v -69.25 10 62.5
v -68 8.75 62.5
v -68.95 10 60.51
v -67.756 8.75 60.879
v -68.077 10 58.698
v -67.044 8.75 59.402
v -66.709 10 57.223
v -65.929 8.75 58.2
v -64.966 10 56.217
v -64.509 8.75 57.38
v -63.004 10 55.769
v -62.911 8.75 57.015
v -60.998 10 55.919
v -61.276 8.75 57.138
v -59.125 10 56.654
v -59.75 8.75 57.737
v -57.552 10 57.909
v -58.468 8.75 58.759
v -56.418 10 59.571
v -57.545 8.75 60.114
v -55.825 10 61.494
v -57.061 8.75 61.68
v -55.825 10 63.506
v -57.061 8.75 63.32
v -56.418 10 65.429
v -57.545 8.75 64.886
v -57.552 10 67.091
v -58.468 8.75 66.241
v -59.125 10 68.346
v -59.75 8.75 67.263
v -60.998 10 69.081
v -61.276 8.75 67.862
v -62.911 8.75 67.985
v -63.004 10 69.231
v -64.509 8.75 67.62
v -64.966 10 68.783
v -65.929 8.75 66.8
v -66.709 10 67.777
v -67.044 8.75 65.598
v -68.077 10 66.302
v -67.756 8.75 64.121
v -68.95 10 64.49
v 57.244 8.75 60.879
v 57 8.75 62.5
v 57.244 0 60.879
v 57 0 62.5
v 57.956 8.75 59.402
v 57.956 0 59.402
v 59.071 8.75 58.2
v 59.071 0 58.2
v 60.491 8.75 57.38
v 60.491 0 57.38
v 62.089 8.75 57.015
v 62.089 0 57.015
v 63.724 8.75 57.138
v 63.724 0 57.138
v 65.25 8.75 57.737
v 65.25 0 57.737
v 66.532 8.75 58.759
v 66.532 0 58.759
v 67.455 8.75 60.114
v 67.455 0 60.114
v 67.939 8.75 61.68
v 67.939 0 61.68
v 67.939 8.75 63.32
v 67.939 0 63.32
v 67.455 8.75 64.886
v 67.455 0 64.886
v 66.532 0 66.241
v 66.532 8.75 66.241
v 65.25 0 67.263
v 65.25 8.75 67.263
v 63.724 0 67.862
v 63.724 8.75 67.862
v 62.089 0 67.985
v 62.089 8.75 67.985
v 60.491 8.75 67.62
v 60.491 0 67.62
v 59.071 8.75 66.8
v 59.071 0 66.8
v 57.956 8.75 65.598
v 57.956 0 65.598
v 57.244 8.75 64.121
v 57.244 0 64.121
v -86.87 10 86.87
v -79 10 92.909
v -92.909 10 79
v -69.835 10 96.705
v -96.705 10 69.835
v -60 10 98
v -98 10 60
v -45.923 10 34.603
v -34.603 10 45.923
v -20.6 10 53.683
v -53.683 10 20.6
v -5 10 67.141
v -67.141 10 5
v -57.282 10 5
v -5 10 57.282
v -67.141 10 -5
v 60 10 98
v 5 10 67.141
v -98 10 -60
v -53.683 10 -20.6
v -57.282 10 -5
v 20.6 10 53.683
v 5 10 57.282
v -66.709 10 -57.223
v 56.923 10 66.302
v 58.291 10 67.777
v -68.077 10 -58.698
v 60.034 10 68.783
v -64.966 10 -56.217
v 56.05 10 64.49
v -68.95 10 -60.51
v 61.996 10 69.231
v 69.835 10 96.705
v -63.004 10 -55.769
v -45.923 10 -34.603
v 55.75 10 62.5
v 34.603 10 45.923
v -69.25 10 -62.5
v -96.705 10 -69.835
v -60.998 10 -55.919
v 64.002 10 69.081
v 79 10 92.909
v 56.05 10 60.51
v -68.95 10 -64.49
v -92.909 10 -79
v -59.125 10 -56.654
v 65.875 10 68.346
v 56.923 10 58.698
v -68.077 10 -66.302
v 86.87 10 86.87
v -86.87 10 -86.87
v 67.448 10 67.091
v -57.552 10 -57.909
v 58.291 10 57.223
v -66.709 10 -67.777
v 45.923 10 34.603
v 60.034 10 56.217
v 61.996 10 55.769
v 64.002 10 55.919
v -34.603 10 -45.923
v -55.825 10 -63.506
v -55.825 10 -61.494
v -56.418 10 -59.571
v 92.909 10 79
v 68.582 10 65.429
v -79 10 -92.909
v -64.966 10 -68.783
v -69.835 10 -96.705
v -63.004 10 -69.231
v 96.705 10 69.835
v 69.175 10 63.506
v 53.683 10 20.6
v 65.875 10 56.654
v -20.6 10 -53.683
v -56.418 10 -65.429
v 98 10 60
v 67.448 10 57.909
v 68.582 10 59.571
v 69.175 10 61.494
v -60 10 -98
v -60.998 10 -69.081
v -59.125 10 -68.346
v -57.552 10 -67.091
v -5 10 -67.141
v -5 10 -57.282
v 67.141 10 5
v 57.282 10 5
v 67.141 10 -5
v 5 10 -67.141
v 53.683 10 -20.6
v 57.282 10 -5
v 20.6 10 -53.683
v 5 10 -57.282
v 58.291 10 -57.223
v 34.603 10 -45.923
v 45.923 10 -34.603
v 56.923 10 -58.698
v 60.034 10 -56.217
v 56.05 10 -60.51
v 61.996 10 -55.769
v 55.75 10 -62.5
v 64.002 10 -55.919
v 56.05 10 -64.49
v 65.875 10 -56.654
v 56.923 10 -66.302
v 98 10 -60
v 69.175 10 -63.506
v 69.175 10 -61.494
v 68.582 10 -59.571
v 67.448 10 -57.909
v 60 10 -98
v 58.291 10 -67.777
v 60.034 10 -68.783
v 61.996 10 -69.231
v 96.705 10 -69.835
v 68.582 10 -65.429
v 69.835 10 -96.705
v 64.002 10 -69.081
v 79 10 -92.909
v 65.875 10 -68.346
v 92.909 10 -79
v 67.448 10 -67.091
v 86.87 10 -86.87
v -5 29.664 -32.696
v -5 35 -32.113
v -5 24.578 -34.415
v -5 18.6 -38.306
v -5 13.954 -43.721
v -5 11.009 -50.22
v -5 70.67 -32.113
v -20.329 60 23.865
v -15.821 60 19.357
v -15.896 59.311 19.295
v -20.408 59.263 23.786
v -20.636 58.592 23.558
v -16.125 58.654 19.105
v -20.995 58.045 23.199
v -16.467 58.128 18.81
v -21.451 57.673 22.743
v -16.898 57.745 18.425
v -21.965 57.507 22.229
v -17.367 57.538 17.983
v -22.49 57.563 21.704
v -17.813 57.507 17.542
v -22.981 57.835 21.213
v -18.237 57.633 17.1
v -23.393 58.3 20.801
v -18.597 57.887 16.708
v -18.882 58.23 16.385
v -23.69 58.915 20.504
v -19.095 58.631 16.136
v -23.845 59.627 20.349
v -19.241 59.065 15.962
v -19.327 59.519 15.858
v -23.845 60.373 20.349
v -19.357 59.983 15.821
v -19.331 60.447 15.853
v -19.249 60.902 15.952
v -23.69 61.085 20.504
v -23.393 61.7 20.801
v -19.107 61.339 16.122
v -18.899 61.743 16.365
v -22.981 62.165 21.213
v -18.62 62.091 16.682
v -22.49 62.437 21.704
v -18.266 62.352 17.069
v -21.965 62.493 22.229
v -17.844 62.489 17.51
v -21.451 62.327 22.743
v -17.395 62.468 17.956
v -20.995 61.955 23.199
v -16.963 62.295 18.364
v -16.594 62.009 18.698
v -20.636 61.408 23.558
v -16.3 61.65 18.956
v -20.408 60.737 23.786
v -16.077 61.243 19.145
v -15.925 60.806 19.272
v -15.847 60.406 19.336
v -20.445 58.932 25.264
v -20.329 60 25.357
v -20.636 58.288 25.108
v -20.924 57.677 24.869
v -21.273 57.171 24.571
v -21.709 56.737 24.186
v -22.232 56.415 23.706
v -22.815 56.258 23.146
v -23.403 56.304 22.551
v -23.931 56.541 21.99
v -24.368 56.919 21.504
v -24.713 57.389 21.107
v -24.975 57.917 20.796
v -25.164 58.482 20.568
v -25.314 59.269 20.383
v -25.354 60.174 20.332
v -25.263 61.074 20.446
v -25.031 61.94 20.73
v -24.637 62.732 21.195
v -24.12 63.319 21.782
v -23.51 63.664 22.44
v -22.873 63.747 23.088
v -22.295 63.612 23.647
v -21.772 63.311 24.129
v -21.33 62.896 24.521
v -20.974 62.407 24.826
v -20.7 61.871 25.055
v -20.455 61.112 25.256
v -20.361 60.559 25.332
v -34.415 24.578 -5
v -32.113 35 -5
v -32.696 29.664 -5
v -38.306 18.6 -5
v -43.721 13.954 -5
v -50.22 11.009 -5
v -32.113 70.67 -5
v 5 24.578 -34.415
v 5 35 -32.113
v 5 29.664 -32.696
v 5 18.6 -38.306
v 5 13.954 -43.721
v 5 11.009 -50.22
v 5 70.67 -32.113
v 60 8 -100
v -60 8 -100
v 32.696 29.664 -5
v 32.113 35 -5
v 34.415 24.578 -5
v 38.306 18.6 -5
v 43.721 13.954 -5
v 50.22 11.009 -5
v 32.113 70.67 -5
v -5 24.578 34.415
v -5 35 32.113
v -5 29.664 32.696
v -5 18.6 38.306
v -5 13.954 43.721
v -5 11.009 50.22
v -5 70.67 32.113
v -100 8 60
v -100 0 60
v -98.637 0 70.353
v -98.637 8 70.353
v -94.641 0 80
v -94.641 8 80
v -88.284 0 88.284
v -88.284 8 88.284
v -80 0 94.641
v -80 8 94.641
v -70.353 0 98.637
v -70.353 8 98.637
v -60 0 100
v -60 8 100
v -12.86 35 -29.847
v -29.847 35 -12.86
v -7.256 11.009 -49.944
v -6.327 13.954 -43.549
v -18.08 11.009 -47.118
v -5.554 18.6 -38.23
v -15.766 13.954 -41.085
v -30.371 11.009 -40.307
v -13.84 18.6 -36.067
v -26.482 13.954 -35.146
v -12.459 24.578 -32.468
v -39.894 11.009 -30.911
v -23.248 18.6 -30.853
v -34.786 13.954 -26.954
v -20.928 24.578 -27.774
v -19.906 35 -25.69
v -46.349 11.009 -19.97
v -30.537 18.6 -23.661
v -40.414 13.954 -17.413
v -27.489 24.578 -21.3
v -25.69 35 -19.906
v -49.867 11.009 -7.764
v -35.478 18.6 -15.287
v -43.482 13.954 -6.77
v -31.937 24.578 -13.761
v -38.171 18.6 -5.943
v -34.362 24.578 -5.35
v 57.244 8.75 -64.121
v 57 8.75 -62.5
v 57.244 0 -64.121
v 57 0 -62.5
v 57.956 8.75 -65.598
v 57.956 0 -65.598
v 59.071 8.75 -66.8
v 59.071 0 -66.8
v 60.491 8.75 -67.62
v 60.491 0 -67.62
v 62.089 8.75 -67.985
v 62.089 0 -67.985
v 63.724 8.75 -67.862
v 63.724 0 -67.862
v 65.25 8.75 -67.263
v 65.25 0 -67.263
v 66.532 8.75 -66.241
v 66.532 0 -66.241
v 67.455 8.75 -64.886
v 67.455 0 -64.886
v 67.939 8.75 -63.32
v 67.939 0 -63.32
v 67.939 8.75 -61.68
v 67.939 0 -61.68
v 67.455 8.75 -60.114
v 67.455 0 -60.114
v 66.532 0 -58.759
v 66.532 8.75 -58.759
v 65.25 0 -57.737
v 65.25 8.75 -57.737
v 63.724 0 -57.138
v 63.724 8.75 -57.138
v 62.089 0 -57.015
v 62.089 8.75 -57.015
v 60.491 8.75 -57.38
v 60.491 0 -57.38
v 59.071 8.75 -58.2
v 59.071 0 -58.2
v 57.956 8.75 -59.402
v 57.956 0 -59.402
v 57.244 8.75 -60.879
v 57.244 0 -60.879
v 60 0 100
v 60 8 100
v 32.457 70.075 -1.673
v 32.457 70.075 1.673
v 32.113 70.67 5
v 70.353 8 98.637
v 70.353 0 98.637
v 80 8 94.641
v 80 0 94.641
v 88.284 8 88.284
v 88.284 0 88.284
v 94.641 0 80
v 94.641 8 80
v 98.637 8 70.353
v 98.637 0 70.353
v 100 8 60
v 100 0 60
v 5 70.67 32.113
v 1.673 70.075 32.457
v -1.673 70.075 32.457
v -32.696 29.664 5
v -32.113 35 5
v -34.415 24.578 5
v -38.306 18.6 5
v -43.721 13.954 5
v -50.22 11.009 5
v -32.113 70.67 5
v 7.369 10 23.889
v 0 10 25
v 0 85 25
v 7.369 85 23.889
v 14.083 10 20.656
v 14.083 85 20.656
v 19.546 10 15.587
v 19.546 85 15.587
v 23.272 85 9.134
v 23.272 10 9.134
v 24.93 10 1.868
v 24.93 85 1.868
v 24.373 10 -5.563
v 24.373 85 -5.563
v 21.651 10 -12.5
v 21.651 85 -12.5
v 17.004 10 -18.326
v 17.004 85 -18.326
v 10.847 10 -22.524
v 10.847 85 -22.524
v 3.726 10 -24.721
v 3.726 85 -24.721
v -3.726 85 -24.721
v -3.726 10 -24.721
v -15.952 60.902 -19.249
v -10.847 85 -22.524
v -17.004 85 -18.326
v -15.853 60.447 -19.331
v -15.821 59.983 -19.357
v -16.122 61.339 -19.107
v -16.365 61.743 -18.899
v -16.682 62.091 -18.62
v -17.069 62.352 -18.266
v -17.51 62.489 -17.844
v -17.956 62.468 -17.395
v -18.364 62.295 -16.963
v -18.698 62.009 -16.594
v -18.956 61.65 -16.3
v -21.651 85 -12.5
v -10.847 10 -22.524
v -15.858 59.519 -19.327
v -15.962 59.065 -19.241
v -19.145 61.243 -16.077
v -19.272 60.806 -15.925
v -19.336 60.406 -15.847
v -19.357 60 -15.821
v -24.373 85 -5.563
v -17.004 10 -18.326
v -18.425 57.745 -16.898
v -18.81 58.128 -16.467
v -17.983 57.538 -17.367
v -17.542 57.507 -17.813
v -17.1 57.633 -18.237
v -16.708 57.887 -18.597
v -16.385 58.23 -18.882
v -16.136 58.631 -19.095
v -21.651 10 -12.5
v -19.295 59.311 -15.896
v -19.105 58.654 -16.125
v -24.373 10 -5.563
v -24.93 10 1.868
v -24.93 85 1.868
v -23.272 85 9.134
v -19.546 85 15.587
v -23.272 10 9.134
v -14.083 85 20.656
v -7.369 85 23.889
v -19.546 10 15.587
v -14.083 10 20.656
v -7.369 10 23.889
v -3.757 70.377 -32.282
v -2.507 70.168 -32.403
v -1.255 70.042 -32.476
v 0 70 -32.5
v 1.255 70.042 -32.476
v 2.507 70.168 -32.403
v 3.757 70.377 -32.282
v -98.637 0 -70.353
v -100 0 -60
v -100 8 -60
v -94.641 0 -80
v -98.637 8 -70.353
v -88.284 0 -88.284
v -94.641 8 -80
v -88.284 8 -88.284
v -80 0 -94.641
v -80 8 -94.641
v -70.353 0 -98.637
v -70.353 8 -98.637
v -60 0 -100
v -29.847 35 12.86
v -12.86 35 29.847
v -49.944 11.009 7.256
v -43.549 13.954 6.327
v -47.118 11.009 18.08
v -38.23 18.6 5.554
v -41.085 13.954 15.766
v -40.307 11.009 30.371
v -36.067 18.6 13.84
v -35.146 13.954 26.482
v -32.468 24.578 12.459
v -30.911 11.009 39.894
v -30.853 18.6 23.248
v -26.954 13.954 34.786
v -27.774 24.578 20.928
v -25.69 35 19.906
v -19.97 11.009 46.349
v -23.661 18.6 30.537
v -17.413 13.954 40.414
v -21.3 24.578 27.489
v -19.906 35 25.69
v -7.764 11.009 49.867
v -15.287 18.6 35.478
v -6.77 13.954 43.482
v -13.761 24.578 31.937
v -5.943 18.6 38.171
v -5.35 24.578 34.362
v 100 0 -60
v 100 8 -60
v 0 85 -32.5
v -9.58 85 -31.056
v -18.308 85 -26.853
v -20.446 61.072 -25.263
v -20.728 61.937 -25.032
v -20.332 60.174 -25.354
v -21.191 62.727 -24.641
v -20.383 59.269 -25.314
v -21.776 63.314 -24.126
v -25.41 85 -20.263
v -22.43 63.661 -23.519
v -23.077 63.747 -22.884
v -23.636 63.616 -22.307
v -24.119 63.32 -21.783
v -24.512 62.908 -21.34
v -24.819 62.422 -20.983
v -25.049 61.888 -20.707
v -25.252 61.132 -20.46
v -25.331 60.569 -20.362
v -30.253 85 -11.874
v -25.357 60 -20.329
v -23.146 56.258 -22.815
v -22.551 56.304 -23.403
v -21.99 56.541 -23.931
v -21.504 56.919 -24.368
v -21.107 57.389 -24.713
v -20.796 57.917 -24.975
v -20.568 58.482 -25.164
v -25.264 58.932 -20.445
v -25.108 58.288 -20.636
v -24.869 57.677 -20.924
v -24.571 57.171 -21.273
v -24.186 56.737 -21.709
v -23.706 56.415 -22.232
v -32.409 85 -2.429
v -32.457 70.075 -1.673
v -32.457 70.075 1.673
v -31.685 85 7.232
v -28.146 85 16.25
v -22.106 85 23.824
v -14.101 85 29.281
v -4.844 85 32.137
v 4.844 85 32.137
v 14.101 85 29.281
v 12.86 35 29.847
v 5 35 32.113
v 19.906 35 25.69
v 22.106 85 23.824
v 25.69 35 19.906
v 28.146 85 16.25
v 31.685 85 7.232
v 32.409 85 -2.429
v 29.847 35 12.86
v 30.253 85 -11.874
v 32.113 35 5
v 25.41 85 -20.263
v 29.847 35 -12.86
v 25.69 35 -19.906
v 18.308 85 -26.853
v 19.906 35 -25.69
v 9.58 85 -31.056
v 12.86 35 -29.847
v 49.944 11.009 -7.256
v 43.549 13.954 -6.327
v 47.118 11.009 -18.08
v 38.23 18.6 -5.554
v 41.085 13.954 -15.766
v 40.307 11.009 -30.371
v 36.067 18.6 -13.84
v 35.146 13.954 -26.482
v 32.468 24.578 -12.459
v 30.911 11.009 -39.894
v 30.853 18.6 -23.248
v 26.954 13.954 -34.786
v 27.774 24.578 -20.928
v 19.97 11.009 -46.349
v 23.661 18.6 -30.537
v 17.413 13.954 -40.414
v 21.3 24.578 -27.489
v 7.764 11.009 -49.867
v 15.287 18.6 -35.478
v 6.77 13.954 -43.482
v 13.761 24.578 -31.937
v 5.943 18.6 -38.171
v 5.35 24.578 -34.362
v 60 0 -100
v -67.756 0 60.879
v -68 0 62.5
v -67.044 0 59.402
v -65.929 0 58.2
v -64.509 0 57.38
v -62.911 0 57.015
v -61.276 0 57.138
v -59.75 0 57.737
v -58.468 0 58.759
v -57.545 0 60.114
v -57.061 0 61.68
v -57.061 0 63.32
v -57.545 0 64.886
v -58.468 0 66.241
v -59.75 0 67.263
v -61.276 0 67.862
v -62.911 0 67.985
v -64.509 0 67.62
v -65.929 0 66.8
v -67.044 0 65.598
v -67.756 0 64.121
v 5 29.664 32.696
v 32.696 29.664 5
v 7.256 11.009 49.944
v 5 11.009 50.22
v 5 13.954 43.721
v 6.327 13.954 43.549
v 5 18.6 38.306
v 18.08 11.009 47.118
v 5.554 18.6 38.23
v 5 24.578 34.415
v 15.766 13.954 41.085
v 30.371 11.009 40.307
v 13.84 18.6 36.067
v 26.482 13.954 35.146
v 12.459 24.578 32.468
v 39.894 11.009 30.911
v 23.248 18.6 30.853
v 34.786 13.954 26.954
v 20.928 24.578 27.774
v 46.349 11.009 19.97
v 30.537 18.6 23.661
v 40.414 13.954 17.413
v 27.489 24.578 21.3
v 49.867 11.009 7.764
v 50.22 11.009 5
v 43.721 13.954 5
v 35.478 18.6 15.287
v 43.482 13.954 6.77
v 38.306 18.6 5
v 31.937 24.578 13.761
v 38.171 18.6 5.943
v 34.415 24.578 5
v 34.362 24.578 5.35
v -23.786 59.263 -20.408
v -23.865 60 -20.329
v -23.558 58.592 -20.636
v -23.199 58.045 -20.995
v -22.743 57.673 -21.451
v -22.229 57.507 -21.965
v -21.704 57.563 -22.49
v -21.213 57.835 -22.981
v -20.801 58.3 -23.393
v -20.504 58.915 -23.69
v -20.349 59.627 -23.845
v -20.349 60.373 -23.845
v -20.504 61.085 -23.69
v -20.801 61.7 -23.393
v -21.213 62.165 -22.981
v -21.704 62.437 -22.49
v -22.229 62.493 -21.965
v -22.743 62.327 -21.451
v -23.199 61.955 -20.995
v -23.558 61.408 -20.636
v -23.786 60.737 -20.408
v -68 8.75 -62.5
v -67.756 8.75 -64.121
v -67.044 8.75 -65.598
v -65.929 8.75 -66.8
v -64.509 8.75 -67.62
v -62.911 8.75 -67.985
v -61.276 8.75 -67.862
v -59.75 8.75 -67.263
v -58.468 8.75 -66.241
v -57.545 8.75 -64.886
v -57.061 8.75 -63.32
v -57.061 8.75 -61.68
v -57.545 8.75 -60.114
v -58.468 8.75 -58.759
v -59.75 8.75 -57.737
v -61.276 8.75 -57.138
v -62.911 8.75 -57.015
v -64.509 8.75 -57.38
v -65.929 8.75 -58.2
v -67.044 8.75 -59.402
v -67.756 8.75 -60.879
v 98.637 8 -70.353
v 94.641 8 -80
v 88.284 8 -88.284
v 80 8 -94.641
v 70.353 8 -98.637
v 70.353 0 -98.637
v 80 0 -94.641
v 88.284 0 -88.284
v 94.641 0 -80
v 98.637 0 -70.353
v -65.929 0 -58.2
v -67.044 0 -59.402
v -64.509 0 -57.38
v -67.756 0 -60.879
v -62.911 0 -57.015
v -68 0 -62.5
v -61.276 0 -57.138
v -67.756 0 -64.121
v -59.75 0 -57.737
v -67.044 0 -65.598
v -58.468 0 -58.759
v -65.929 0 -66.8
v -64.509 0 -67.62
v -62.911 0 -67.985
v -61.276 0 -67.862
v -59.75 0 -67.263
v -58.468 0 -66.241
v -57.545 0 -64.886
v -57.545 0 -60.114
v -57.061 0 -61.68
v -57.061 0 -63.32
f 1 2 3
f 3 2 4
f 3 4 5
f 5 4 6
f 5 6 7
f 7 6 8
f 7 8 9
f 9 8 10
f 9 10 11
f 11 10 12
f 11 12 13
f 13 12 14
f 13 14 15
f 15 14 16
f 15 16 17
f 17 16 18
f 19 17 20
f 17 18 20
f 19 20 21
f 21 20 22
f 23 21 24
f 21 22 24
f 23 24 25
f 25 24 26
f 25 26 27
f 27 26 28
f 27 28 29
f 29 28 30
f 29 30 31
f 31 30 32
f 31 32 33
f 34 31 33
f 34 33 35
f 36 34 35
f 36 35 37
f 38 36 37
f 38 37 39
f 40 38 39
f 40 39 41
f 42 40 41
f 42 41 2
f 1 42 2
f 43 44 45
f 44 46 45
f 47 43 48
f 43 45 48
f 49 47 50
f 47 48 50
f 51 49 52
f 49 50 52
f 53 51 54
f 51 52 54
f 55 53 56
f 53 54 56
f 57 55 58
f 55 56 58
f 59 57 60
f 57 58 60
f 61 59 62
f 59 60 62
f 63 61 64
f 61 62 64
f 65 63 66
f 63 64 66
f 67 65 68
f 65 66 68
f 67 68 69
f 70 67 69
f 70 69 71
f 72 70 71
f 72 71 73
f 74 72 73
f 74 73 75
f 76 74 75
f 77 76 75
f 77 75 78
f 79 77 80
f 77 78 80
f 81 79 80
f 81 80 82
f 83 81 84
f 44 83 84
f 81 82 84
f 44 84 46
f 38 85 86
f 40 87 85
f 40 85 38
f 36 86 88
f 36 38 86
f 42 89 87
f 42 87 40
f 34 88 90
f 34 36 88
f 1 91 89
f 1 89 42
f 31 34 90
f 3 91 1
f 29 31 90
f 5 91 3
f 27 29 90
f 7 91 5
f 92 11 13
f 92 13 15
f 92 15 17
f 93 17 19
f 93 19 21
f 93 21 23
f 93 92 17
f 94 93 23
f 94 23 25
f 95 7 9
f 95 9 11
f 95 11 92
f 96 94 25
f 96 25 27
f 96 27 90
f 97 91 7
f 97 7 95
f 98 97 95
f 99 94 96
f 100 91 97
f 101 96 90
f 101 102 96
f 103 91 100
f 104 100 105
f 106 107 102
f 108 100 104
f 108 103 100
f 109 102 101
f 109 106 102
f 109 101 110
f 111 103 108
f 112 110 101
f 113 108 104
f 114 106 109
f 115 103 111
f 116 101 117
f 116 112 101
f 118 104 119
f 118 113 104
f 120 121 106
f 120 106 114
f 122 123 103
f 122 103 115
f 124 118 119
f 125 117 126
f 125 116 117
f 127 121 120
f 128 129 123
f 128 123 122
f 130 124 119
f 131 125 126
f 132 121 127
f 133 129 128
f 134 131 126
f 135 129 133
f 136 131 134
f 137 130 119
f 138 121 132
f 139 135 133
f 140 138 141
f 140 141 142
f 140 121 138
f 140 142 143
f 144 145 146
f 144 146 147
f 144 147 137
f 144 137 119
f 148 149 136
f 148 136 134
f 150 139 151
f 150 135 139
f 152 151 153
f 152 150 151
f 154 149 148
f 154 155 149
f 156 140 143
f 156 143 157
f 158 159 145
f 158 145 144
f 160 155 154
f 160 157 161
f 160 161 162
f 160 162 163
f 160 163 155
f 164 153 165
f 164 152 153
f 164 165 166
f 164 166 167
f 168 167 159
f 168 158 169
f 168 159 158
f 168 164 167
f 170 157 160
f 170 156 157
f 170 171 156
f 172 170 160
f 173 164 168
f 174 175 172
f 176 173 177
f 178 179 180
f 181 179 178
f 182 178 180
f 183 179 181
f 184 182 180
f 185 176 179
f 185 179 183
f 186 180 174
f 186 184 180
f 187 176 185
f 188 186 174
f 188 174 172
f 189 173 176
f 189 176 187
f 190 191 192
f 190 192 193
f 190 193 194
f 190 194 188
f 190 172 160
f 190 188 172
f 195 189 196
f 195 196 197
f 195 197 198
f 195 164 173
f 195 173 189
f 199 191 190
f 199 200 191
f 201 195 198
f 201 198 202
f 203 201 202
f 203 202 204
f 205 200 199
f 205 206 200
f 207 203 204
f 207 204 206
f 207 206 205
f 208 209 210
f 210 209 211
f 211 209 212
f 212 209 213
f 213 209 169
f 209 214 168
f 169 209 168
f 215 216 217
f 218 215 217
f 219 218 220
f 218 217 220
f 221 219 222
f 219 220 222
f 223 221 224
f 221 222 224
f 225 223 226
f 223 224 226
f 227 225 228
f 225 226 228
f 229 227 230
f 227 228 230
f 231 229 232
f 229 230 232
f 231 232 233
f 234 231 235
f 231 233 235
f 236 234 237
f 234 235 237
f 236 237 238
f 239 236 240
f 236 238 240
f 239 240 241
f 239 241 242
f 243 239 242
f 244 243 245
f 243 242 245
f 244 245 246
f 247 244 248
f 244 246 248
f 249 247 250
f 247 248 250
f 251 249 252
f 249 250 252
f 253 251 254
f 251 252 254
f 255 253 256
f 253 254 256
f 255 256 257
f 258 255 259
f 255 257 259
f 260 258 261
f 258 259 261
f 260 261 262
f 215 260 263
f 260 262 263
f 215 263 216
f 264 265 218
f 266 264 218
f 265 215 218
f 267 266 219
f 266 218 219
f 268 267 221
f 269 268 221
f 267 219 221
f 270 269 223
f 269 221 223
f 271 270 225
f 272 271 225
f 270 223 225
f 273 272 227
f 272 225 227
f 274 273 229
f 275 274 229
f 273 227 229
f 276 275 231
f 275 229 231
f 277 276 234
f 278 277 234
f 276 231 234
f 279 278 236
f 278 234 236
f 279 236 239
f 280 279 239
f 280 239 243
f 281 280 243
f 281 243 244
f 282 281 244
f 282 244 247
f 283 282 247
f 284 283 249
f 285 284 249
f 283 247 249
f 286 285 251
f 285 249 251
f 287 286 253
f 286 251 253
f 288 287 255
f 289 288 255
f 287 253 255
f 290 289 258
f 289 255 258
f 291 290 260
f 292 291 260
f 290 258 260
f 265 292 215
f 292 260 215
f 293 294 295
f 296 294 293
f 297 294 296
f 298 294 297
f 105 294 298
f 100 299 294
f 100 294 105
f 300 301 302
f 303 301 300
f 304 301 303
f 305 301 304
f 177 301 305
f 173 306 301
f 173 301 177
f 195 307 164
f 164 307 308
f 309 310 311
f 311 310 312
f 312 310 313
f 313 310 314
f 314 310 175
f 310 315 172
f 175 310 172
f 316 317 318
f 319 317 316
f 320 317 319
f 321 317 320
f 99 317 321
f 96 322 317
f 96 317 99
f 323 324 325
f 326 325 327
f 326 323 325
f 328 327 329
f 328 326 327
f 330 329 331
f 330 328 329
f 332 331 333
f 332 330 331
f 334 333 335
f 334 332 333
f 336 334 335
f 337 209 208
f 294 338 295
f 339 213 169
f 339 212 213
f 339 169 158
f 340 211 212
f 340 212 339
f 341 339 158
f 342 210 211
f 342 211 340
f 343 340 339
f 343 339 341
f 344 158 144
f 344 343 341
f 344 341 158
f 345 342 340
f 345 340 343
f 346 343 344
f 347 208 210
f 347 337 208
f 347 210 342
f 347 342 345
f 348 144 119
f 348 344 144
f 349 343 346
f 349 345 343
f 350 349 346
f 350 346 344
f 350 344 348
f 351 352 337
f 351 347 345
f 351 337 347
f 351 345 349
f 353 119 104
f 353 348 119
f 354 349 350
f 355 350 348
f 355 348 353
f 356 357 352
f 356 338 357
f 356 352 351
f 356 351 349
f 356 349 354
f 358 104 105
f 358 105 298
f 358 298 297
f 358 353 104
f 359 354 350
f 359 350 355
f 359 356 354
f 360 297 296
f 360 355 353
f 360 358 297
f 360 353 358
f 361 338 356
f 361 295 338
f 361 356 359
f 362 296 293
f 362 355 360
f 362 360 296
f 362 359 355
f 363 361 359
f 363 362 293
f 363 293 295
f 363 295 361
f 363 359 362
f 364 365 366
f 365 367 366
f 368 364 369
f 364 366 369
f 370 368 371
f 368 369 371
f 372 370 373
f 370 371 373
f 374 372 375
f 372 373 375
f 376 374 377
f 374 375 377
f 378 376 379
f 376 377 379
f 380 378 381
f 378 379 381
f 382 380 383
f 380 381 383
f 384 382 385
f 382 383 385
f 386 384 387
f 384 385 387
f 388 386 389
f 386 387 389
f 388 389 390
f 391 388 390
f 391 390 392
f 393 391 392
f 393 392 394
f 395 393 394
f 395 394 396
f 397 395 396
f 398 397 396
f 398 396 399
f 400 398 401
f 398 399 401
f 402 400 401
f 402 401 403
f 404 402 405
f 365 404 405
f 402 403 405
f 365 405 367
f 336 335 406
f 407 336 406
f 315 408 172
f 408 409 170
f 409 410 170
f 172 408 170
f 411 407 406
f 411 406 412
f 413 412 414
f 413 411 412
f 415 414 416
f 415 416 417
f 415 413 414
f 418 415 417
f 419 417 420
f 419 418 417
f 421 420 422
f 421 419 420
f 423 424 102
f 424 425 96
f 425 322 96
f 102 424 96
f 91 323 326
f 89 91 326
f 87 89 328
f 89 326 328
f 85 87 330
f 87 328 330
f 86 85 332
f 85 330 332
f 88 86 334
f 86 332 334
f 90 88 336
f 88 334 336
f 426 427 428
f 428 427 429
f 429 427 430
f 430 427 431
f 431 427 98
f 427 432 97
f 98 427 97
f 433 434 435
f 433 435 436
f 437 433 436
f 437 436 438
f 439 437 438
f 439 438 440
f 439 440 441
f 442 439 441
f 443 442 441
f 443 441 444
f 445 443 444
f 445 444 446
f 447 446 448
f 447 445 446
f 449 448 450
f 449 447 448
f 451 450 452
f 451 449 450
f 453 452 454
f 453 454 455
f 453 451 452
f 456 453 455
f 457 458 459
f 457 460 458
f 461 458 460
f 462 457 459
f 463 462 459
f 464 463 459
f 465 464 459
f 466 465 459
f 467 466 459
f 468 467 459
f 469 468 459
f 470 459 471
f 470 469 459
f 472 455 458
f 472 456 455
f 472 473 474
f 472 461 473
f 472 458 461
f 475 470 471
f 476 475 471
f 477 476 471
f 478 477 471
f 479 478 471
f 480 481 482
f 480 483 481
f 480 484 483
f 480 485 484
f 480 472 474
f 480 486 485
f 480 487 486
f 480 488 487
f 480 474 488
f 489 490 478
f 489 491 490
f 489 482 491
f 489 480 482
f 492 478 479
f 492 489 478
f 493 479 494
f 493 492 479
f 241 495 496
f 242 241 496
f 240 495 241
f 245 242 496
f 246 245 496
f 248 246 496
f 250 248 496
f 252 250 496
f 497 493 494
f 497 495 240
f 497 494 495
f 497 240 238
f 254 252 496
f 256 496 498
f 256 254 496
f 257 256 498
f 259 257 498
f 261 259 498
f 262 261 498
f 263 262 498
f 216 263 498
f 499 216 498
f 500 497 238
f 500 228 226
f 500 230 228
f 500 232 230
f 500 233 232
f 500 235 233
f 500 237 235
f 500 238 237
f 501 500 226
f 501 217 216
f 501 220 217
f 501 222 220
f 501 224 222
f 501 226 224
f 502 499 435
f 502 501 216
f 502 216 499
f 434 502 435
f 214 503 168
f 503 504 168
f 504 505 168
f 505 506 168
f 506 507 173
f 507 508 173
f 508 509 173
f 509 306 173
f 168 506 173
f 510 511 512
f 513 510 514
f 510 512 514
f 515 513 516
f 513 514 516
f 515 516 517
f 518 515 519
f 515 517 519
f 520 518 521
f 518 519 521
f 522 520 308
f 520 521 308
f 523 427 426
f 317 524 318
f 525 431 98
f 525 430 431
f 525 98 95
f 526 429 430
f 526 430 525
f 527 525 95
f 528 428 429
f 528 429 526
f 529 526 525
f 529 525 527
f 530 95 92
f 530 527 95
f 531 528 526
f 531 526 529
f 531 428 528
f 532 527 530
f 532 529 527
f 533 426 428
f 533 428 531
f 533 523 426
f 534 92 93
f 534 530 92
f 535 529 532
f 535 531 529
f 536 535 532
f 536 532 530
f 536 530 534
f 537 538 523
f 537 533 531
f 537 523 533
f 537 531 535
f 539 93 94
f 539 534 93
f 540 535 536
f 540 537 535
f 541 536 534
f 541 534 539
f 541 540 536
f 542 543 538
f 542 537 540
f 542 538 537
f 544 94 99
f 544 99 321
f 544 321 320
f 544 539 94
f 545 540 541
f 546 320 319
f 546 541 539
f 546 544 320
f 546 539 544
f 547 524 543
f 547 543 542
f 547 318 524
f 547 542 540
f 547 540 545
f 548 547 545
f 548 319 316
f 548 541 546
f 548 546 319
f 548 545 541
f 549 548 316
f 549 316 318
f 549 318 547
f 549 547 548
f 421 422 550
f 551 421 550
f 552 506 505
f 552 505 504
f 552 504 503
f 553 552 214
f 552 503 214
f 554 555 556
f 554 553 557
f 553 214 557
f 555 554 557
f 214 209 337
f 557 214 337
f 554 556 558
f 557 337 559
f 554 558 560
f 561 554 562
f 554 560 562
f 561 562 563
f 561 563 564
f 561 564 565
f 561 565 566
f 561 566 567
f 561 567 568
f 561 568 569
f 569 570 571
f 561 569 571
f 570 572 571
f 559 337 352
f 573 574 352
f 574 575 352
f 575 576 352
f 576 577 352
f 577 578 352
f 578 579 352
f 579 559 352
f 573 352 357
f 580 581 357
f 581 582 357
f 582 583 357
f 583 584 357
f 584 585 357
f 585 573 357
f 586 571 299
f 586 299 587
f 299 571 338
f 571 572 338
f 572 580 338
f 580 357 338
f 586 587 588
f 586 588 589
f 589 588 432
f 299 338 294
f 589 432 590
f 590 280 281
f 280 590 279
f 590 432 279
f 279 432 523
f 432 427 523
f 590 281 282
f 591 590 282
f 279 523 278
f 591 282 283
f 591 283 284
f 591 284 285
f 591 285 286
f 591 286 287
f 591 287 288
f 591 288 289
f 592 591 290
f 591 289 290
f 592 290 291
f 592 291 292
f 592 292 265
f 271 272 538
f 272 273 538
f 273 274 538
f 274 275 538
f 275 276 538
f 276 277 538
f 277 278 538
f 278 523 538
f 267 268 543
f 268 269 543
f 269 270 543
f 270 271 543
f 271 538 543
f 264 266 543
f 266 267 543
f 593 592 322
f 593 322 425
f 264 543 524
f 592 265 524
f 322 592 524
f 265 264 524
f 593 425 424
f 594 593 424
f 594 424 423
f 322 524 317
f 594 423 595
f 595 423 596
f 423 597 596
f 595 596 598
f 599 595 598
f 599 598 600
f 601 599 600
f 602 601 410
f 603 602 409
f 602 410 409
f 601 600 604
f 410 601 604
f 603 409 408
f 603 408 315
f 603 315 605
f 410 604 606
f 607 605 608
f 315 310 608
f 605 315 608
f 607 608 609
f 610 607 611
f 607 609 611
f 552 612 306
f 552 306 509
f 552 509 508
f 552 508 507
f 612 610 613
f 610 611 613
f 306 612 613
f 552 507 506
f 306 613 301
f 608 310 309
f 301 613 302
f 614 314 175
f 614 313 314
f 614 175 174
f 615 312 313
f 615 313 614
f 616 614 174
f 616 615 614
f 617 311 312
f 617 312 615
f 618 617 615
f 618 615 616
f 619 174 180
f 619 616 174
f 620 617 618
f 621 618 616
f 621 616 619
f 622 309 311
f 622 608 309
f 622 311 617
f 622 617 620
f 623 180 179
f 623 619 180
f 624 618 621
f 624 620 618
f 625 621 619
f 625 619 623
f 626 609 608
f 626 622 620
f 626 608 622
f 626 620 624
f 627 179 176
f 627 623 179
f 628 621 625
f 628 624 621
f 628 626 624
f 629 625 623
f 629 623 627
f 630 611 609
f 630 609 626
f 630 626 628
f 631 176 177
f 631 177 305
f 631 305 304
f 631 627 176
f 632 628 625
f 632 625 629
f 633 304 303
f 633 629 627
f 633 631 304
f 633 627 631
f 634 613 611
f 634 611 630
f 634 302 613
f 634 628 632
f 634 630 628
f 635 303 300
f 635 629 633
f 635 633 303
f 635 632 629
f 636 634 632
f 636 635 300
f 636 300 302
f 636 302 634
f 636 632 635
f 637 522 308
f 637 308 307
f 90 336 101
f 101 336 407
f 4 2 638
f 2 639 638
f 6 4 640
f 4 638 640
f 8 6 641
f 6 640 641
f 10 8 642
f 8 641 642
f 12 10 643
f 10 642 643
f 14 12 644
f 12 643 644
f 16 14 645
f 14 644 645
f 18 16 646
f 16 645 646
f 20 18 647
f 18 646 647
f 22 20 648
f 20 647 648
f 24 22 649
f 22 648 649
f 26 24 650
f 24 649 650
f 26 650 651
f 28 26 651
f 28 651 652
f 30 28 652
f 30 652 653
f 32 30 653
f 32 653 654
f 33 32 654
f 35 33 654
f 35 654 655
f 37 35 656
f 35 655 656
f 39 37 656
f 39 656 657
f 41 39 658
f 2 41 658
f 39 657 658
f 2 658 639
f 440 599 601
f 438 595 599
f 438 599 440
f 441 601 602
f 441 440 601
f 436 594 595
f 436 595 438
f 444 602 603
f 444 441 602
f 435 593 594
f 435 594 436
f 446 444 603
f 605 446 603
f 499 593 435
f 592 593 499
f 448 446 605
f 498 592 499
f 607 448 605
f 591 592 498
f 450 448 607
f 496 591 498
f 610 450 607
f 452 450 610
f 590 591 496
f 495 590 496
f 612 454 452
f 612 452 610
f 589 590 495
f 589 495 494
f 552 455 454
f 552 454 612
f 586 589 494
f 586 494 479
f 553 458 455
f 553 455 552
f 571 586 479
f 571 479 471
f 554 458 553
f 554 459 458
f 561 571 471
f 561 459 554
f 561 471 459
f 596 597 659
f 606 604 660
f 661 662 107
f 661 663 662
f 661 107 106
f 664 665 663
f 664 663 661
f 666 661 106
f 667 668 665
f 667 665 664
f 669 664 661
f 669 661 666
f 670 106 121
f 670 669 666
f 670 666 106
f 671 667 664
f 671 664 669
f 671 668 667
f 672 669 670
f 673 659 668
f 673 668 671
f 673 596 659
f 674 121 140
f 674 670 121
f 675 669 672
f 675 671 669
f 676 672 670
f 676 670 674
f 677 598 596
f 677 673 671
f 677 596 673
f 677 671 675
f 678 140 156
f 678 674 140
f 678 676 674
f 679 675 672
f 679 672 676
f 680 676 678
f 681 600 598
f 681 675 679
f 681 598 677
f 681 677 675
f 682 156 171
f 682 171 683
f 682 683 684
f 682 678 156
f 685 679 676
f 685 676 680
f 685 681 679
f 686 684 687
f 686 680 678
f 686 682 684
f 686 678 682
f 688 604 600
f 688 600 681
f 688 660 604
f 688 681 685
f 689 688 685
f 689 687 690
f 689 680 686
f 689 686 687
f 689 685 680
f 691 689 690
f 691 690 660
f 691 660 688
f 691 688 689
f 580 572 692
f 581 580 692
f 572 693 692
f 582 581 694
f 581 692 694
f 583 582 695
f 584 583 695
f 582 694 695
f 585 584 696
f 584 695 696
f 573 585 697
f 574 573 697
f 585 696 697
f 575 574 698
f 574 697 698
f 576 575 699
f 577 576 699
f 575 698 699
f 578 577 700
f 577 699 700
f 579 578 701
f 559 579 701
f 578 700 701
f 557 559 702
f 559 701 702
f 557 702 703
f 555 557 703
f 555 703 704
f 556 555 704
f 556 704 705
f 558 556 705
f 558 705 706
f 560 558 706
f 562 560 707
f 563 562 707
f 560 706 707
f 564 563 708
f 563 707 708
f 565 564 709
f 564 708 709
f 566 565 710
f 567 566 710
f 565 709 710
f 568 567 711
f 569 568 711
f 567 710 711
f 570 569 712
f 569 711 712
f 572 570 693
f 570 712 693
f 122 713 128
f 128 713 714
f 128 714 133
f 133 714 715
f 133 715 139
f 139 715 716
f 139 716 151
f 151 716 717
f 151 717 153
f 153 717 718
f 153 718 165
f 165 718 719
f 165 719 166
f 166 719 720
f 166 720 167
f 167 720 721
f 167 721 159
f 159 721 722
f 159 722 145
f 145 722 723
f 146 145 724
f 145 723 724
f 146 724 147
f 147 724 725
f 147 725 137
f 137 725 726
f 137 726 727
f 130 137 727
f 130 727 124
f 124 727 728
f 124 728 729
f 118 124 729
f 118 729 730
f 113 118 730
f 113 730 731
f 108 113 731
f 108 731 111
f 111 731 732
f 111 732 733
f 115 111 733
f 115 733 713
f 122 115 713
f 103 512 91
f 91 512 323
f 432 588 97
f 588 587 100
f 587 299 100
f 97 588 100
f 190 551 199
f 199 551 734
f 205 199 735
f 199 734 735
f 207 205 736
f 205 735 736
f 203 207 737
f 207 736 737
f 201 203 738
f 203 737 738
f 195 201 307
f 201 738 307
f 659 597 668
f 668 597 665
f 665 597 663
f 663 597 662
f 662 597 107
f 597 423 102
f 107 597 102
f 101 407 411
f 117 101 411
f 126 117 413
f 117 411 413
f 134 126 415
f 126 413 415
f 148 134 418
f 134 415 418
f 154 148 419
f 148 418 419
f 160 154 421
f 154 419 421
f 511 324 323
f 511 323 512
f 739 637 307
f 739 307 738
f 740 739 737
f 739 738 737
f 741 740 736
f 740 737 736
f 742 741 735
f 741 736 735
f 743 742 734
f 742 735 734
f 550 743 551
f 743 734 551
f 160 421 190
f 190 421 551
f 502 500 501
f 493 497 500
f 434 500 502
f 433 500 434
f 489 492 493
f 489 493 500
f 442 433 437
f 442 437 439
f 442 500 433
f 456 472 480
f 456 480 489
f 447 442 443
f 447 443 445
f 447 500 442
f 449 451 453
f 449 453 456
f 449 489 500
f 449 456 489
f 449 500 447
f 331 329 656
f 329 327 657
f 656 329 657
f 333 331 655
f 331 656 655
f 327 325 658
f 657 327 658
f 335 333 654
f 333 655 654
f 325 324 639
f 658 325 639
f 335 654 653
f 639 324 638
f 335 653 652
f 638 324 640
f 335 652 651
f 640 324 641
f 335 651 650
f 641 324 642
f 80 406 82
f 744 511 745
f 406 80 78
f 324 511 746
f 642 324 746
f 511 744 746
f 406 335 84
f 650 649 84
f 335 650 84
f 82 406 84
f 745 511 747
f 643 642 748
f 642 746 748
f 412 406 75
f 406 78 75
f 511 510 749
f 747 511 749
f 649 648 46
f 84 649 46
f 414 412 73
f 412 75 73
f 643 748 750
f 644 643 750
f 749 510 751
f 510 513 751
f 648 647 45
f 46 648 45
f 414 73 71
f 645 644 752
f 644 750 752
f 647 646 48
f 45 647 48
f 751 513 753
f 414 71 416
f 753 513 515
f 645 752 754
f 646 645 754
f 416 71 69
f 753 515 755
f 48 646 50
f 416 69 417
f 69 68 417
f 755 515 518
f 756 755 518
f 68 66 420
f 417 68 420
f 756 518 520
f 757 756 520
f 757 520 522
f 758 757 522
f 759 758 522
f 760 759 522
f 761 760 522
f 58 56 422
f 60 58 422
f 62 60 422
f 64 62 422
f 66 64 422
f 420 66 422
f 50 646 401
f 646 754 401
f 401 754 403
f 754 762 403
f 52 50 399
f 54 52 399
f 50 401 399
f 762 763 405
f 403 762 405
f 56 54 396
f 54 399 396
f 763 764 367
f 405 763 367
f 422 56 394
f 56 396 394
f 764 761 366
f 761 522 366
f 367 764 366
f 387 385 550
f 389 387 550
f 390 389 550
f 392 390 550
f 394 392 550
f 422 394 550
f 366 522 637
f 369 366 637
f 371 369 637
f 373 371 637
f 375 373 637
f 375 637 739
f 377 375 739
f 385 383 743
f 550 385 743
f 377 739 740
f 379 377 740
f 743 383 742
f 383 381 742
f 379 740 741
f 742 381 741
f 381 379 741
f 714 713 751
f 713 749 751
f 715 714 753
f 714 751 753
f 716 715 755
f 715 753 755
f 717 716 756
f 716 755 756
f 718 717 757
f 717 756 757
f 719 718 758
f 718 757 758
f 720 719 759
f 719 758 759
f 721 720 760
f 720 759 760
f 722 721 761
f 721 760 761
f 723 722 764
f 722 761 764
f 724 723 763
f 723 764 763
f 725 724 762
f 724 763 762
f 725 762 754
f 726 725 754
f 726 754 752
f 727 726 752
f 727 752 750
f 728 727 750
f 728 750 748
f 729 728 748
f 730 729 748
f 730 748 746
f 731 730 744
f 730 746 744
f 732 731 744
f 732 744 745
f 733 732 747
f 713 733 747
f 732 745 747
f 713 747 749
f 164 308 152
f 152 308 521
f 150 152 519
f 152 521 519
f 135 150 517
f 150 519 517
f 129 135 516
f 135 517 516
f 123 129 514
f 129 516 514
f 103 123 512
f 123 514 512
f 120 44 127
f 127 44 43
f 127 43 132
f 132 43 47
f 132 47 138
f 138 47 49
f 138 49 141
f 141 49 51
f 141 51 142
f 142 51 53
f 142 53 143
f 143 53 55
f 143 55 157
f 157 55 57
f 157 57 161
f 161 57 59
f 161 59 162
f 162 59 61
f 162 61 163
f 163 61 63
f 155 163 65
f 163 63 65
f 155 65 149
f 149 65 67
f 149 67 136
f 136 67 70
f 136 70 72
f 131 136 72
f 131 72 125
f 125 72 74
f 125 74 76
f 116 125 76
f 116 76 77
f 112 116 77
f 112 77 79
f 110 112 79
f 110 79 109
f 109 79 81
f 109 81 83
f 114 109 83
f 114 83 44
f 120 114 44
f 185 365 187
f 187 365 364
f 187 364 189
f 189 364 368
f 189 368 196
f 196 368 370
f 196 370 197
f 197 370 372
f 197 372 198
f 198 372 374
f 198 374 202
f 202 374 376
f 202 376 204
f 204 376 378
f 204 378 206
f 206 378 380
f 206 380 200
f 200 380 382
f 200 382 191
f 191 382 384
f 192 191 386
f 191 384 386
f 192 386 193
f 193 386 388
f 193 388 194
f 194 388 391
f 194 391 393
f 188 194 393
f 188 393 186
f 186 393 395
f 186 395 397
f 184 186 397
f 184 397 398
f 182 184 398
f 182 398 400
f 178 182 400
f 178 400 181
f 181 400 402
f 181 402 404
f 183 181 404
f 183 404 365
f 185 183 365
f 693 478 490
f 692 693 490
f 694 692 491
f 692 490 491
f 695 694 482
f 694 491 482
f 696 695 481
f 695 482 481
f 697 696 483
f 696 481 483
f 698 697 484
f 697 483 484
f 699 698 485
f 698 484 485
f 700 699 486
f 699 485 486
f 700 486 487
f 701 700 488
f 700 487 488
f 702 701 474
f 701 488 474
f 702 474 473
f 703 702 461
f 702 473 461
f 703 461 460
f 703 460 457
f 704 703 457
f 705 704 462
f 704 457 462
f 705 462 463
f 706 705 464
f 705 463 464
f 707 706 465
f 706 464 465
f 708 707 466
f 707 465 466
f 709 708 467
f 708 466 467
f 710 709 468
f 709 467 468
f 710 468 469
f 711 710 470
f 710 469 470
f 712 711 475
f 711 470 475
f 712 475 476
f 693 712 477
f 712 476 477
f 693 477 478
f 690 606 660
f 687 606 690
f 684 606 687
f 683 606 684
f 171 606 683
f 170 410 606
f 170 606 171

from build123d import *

# Parameters (mm, degrees)
SKETCH2_W                       = 200
SKETCH2_H                       = 200
BOSS_EXTRUDE1_DEPTH             = 10
SKETCH3_R                       = 32.5
SKETCH3_R_2                     = 25
BOSS_EXTRUDE2_DEPTH             = 75
M10_CLEARANCE_HOLE1_D           = 11
M10_CLEARANCE_HOLE1_CSINK_D     = 13.5
M10_CLEARANCE_HOLE1_CSINK_ANGLE = 90
CIRPATTERN1_COUNT               = 2
CIRPATTERN1_ANGLE               = 90
RIB5_REACH                      = 167
SKETCH13_WALL_W                 = 401.282032406
SKETCH13_WALL_H                 = 10
CIRPATTERN2_COUNT               = 4
FILLET1_R                       = 25
FILLET2_R                       = 40
CHAMFER1_SIZE                   = 2


# Read off the part's stored shape, not the designer's step: M6x1.0 Tapped Hole1
with BuildPart() as part:
    # Sketch2 → Boss-Extrude1 (new body)
    with BuildSketch(Plane(origin=(0, 0, 0), x_dir=(1, 0, 0), z_dir=(0, 1, 0))):
        Rectangle(SKETCH2_W, SKETCH2_H)
    extrude(amount=BOSS_EXTRUDE1_DEPTH)

    # Sketch3 → Boss-Extrude2 (add)
    with BuildSketch(Plane(origin=(0, 10, 0), x_dir=(1, 0, 0), z_dir=(0, 1, 0))):
        with Locations(Location((0, 0, 0), (0, 0, 90))):
            Circle(SKETCH3_R)
        with Locations(Location((0, 0, 0), (0, 0, 270))):
            Circle(SKETCH3_R_2, mode=Mode.SUBTRACT)
    extrude(amount=BOSS_EXTRUDE2_DEPTH)

    # M10 Clearance Hole1 (through all)
    with Locations(Plane(origin=(0, 10, 0), x_dir=(1, 0, 0), z_dir=(0, 1, 0))):
        with Locations((-62.5, -62.5), (62.5, 62.5), (-62.5, 62.5), (62.5, -62.5)):
            CounterSinkHole(M10_CLEARANCE_HOLE1_D / 2, M10_CLEARANCE_HOLE1_CSINK_D / 2, counter_sink_angle=M10_CLEARANCE_HOLE1_CSINK_ANGLE)

    # M6x1.0 Tapped Hole1 outline → M6x1.0 Tapped Hole1 (revolve, cut)
    with BuildSketch(Plane(origin=(0, 60, 0), x_dir=(0.707106781186546, 0, 0.707106781186549), z_dir=(0, 1, 0))):
        Polygon((0, -32.500112934), (3.750112934, -32.500112934), (2.5, -31.25), (2.5, -24.874618187), (0, -24.874618187), align=None)
    m6x1_0_tapped_hole1 = revolve(axis=Axis((0, 60, 0), (0.707106781186549, 0, -0.707106781186546)), mode=Mode.SUBTRACT)

    # CirPattern1: M6x1.0 Tapped Hole1 ×2 about axis
    cirpattern1_axis = Axis((0, 85, 0), (0, -1, 0))
    for i in range(1, CIRPATTERN1_COUNT):
        add(m6x1_0_tapped_hole1.rotate(cirpattern1_axis, i * CIRPATTERN1_ANGLE / (CIRPATTERN1_COUNT - 1)), mode=Mode.SUBTRACT)

    # Sketch13 wall → Rib5 (add, up to next)
    with BuildSketch(Plane(origin=(-49.820508076, 40, 0), x_dir=(-0.499999999996, -0.866025403787, 0), z_dir=(0.866025403787, -0.499999999996, 0)), mode=Mode.PRIVATE) as rib5_sk1:
        Rectangle(SKETCH13_WALL_W, SKETCH13_WALL_H)
    rib5_tool1 = extrude(rib5_sk1.sketch, amount=RIB5_REACH, mode=Mode.PRIVATE) - part.part
    rib5 = rib5_tool1.solids().sort_by_distance((-49.820508076, 40, 0))[0]
    add(rib5)

    # CirPattern2: Rib5 ×4 about axis
    cirpattern2_axis = Axis((0, 0, 0), (0, 1, 0))
    for i in range(1, CIRPATTERN2_COUNT):
        add(rib5.rotate(cirpattern2_axis, i * 360 / CIRPATTERN2_COUNT))

    # Fillet1
    fillet1_edges = [part.edges().sort_by_distance(p)[0] for p in [
        (-22.980970389, 10, -22.980970389),
        (22.980970389, 10, -22.980970389),
        (22.980970389, 10, 22.980970389),
        (-22.980970389, 10, 22.980970389),
    ]]
    fillet(fillet1_edges, radius=FILLET1_R)

    # Fillet2
    fillet2_edges = [part.edges().sort_by_distance(p)[0] for p in [
        (100, 5, 100),
        (-100, 5, 100),
        (-100, 5, -100),
        (100, 5, -100),
    ]]
    fillet(fillet2_edges, radius=FILLET2_R)

    # Chamfer1
    chamfer1_edges = [part.edges().sort_by_distance(p)[0] for p in [
        (0, 10, 100),
        (-100, 10, 0),
        (0, 10, -100),
        (100, 10, 0),
        (88.284271247, 10, 88.284271247),
        (88.284271247, 10, -88.284271247),
        (-88.284271247, 10, -88.284271247),
        (-88.284271247, 10, 88.284271247),
    ]]
    chamfer(chamfer1_edges, length=CHAMFER1_SIZE)


solid = part.part
